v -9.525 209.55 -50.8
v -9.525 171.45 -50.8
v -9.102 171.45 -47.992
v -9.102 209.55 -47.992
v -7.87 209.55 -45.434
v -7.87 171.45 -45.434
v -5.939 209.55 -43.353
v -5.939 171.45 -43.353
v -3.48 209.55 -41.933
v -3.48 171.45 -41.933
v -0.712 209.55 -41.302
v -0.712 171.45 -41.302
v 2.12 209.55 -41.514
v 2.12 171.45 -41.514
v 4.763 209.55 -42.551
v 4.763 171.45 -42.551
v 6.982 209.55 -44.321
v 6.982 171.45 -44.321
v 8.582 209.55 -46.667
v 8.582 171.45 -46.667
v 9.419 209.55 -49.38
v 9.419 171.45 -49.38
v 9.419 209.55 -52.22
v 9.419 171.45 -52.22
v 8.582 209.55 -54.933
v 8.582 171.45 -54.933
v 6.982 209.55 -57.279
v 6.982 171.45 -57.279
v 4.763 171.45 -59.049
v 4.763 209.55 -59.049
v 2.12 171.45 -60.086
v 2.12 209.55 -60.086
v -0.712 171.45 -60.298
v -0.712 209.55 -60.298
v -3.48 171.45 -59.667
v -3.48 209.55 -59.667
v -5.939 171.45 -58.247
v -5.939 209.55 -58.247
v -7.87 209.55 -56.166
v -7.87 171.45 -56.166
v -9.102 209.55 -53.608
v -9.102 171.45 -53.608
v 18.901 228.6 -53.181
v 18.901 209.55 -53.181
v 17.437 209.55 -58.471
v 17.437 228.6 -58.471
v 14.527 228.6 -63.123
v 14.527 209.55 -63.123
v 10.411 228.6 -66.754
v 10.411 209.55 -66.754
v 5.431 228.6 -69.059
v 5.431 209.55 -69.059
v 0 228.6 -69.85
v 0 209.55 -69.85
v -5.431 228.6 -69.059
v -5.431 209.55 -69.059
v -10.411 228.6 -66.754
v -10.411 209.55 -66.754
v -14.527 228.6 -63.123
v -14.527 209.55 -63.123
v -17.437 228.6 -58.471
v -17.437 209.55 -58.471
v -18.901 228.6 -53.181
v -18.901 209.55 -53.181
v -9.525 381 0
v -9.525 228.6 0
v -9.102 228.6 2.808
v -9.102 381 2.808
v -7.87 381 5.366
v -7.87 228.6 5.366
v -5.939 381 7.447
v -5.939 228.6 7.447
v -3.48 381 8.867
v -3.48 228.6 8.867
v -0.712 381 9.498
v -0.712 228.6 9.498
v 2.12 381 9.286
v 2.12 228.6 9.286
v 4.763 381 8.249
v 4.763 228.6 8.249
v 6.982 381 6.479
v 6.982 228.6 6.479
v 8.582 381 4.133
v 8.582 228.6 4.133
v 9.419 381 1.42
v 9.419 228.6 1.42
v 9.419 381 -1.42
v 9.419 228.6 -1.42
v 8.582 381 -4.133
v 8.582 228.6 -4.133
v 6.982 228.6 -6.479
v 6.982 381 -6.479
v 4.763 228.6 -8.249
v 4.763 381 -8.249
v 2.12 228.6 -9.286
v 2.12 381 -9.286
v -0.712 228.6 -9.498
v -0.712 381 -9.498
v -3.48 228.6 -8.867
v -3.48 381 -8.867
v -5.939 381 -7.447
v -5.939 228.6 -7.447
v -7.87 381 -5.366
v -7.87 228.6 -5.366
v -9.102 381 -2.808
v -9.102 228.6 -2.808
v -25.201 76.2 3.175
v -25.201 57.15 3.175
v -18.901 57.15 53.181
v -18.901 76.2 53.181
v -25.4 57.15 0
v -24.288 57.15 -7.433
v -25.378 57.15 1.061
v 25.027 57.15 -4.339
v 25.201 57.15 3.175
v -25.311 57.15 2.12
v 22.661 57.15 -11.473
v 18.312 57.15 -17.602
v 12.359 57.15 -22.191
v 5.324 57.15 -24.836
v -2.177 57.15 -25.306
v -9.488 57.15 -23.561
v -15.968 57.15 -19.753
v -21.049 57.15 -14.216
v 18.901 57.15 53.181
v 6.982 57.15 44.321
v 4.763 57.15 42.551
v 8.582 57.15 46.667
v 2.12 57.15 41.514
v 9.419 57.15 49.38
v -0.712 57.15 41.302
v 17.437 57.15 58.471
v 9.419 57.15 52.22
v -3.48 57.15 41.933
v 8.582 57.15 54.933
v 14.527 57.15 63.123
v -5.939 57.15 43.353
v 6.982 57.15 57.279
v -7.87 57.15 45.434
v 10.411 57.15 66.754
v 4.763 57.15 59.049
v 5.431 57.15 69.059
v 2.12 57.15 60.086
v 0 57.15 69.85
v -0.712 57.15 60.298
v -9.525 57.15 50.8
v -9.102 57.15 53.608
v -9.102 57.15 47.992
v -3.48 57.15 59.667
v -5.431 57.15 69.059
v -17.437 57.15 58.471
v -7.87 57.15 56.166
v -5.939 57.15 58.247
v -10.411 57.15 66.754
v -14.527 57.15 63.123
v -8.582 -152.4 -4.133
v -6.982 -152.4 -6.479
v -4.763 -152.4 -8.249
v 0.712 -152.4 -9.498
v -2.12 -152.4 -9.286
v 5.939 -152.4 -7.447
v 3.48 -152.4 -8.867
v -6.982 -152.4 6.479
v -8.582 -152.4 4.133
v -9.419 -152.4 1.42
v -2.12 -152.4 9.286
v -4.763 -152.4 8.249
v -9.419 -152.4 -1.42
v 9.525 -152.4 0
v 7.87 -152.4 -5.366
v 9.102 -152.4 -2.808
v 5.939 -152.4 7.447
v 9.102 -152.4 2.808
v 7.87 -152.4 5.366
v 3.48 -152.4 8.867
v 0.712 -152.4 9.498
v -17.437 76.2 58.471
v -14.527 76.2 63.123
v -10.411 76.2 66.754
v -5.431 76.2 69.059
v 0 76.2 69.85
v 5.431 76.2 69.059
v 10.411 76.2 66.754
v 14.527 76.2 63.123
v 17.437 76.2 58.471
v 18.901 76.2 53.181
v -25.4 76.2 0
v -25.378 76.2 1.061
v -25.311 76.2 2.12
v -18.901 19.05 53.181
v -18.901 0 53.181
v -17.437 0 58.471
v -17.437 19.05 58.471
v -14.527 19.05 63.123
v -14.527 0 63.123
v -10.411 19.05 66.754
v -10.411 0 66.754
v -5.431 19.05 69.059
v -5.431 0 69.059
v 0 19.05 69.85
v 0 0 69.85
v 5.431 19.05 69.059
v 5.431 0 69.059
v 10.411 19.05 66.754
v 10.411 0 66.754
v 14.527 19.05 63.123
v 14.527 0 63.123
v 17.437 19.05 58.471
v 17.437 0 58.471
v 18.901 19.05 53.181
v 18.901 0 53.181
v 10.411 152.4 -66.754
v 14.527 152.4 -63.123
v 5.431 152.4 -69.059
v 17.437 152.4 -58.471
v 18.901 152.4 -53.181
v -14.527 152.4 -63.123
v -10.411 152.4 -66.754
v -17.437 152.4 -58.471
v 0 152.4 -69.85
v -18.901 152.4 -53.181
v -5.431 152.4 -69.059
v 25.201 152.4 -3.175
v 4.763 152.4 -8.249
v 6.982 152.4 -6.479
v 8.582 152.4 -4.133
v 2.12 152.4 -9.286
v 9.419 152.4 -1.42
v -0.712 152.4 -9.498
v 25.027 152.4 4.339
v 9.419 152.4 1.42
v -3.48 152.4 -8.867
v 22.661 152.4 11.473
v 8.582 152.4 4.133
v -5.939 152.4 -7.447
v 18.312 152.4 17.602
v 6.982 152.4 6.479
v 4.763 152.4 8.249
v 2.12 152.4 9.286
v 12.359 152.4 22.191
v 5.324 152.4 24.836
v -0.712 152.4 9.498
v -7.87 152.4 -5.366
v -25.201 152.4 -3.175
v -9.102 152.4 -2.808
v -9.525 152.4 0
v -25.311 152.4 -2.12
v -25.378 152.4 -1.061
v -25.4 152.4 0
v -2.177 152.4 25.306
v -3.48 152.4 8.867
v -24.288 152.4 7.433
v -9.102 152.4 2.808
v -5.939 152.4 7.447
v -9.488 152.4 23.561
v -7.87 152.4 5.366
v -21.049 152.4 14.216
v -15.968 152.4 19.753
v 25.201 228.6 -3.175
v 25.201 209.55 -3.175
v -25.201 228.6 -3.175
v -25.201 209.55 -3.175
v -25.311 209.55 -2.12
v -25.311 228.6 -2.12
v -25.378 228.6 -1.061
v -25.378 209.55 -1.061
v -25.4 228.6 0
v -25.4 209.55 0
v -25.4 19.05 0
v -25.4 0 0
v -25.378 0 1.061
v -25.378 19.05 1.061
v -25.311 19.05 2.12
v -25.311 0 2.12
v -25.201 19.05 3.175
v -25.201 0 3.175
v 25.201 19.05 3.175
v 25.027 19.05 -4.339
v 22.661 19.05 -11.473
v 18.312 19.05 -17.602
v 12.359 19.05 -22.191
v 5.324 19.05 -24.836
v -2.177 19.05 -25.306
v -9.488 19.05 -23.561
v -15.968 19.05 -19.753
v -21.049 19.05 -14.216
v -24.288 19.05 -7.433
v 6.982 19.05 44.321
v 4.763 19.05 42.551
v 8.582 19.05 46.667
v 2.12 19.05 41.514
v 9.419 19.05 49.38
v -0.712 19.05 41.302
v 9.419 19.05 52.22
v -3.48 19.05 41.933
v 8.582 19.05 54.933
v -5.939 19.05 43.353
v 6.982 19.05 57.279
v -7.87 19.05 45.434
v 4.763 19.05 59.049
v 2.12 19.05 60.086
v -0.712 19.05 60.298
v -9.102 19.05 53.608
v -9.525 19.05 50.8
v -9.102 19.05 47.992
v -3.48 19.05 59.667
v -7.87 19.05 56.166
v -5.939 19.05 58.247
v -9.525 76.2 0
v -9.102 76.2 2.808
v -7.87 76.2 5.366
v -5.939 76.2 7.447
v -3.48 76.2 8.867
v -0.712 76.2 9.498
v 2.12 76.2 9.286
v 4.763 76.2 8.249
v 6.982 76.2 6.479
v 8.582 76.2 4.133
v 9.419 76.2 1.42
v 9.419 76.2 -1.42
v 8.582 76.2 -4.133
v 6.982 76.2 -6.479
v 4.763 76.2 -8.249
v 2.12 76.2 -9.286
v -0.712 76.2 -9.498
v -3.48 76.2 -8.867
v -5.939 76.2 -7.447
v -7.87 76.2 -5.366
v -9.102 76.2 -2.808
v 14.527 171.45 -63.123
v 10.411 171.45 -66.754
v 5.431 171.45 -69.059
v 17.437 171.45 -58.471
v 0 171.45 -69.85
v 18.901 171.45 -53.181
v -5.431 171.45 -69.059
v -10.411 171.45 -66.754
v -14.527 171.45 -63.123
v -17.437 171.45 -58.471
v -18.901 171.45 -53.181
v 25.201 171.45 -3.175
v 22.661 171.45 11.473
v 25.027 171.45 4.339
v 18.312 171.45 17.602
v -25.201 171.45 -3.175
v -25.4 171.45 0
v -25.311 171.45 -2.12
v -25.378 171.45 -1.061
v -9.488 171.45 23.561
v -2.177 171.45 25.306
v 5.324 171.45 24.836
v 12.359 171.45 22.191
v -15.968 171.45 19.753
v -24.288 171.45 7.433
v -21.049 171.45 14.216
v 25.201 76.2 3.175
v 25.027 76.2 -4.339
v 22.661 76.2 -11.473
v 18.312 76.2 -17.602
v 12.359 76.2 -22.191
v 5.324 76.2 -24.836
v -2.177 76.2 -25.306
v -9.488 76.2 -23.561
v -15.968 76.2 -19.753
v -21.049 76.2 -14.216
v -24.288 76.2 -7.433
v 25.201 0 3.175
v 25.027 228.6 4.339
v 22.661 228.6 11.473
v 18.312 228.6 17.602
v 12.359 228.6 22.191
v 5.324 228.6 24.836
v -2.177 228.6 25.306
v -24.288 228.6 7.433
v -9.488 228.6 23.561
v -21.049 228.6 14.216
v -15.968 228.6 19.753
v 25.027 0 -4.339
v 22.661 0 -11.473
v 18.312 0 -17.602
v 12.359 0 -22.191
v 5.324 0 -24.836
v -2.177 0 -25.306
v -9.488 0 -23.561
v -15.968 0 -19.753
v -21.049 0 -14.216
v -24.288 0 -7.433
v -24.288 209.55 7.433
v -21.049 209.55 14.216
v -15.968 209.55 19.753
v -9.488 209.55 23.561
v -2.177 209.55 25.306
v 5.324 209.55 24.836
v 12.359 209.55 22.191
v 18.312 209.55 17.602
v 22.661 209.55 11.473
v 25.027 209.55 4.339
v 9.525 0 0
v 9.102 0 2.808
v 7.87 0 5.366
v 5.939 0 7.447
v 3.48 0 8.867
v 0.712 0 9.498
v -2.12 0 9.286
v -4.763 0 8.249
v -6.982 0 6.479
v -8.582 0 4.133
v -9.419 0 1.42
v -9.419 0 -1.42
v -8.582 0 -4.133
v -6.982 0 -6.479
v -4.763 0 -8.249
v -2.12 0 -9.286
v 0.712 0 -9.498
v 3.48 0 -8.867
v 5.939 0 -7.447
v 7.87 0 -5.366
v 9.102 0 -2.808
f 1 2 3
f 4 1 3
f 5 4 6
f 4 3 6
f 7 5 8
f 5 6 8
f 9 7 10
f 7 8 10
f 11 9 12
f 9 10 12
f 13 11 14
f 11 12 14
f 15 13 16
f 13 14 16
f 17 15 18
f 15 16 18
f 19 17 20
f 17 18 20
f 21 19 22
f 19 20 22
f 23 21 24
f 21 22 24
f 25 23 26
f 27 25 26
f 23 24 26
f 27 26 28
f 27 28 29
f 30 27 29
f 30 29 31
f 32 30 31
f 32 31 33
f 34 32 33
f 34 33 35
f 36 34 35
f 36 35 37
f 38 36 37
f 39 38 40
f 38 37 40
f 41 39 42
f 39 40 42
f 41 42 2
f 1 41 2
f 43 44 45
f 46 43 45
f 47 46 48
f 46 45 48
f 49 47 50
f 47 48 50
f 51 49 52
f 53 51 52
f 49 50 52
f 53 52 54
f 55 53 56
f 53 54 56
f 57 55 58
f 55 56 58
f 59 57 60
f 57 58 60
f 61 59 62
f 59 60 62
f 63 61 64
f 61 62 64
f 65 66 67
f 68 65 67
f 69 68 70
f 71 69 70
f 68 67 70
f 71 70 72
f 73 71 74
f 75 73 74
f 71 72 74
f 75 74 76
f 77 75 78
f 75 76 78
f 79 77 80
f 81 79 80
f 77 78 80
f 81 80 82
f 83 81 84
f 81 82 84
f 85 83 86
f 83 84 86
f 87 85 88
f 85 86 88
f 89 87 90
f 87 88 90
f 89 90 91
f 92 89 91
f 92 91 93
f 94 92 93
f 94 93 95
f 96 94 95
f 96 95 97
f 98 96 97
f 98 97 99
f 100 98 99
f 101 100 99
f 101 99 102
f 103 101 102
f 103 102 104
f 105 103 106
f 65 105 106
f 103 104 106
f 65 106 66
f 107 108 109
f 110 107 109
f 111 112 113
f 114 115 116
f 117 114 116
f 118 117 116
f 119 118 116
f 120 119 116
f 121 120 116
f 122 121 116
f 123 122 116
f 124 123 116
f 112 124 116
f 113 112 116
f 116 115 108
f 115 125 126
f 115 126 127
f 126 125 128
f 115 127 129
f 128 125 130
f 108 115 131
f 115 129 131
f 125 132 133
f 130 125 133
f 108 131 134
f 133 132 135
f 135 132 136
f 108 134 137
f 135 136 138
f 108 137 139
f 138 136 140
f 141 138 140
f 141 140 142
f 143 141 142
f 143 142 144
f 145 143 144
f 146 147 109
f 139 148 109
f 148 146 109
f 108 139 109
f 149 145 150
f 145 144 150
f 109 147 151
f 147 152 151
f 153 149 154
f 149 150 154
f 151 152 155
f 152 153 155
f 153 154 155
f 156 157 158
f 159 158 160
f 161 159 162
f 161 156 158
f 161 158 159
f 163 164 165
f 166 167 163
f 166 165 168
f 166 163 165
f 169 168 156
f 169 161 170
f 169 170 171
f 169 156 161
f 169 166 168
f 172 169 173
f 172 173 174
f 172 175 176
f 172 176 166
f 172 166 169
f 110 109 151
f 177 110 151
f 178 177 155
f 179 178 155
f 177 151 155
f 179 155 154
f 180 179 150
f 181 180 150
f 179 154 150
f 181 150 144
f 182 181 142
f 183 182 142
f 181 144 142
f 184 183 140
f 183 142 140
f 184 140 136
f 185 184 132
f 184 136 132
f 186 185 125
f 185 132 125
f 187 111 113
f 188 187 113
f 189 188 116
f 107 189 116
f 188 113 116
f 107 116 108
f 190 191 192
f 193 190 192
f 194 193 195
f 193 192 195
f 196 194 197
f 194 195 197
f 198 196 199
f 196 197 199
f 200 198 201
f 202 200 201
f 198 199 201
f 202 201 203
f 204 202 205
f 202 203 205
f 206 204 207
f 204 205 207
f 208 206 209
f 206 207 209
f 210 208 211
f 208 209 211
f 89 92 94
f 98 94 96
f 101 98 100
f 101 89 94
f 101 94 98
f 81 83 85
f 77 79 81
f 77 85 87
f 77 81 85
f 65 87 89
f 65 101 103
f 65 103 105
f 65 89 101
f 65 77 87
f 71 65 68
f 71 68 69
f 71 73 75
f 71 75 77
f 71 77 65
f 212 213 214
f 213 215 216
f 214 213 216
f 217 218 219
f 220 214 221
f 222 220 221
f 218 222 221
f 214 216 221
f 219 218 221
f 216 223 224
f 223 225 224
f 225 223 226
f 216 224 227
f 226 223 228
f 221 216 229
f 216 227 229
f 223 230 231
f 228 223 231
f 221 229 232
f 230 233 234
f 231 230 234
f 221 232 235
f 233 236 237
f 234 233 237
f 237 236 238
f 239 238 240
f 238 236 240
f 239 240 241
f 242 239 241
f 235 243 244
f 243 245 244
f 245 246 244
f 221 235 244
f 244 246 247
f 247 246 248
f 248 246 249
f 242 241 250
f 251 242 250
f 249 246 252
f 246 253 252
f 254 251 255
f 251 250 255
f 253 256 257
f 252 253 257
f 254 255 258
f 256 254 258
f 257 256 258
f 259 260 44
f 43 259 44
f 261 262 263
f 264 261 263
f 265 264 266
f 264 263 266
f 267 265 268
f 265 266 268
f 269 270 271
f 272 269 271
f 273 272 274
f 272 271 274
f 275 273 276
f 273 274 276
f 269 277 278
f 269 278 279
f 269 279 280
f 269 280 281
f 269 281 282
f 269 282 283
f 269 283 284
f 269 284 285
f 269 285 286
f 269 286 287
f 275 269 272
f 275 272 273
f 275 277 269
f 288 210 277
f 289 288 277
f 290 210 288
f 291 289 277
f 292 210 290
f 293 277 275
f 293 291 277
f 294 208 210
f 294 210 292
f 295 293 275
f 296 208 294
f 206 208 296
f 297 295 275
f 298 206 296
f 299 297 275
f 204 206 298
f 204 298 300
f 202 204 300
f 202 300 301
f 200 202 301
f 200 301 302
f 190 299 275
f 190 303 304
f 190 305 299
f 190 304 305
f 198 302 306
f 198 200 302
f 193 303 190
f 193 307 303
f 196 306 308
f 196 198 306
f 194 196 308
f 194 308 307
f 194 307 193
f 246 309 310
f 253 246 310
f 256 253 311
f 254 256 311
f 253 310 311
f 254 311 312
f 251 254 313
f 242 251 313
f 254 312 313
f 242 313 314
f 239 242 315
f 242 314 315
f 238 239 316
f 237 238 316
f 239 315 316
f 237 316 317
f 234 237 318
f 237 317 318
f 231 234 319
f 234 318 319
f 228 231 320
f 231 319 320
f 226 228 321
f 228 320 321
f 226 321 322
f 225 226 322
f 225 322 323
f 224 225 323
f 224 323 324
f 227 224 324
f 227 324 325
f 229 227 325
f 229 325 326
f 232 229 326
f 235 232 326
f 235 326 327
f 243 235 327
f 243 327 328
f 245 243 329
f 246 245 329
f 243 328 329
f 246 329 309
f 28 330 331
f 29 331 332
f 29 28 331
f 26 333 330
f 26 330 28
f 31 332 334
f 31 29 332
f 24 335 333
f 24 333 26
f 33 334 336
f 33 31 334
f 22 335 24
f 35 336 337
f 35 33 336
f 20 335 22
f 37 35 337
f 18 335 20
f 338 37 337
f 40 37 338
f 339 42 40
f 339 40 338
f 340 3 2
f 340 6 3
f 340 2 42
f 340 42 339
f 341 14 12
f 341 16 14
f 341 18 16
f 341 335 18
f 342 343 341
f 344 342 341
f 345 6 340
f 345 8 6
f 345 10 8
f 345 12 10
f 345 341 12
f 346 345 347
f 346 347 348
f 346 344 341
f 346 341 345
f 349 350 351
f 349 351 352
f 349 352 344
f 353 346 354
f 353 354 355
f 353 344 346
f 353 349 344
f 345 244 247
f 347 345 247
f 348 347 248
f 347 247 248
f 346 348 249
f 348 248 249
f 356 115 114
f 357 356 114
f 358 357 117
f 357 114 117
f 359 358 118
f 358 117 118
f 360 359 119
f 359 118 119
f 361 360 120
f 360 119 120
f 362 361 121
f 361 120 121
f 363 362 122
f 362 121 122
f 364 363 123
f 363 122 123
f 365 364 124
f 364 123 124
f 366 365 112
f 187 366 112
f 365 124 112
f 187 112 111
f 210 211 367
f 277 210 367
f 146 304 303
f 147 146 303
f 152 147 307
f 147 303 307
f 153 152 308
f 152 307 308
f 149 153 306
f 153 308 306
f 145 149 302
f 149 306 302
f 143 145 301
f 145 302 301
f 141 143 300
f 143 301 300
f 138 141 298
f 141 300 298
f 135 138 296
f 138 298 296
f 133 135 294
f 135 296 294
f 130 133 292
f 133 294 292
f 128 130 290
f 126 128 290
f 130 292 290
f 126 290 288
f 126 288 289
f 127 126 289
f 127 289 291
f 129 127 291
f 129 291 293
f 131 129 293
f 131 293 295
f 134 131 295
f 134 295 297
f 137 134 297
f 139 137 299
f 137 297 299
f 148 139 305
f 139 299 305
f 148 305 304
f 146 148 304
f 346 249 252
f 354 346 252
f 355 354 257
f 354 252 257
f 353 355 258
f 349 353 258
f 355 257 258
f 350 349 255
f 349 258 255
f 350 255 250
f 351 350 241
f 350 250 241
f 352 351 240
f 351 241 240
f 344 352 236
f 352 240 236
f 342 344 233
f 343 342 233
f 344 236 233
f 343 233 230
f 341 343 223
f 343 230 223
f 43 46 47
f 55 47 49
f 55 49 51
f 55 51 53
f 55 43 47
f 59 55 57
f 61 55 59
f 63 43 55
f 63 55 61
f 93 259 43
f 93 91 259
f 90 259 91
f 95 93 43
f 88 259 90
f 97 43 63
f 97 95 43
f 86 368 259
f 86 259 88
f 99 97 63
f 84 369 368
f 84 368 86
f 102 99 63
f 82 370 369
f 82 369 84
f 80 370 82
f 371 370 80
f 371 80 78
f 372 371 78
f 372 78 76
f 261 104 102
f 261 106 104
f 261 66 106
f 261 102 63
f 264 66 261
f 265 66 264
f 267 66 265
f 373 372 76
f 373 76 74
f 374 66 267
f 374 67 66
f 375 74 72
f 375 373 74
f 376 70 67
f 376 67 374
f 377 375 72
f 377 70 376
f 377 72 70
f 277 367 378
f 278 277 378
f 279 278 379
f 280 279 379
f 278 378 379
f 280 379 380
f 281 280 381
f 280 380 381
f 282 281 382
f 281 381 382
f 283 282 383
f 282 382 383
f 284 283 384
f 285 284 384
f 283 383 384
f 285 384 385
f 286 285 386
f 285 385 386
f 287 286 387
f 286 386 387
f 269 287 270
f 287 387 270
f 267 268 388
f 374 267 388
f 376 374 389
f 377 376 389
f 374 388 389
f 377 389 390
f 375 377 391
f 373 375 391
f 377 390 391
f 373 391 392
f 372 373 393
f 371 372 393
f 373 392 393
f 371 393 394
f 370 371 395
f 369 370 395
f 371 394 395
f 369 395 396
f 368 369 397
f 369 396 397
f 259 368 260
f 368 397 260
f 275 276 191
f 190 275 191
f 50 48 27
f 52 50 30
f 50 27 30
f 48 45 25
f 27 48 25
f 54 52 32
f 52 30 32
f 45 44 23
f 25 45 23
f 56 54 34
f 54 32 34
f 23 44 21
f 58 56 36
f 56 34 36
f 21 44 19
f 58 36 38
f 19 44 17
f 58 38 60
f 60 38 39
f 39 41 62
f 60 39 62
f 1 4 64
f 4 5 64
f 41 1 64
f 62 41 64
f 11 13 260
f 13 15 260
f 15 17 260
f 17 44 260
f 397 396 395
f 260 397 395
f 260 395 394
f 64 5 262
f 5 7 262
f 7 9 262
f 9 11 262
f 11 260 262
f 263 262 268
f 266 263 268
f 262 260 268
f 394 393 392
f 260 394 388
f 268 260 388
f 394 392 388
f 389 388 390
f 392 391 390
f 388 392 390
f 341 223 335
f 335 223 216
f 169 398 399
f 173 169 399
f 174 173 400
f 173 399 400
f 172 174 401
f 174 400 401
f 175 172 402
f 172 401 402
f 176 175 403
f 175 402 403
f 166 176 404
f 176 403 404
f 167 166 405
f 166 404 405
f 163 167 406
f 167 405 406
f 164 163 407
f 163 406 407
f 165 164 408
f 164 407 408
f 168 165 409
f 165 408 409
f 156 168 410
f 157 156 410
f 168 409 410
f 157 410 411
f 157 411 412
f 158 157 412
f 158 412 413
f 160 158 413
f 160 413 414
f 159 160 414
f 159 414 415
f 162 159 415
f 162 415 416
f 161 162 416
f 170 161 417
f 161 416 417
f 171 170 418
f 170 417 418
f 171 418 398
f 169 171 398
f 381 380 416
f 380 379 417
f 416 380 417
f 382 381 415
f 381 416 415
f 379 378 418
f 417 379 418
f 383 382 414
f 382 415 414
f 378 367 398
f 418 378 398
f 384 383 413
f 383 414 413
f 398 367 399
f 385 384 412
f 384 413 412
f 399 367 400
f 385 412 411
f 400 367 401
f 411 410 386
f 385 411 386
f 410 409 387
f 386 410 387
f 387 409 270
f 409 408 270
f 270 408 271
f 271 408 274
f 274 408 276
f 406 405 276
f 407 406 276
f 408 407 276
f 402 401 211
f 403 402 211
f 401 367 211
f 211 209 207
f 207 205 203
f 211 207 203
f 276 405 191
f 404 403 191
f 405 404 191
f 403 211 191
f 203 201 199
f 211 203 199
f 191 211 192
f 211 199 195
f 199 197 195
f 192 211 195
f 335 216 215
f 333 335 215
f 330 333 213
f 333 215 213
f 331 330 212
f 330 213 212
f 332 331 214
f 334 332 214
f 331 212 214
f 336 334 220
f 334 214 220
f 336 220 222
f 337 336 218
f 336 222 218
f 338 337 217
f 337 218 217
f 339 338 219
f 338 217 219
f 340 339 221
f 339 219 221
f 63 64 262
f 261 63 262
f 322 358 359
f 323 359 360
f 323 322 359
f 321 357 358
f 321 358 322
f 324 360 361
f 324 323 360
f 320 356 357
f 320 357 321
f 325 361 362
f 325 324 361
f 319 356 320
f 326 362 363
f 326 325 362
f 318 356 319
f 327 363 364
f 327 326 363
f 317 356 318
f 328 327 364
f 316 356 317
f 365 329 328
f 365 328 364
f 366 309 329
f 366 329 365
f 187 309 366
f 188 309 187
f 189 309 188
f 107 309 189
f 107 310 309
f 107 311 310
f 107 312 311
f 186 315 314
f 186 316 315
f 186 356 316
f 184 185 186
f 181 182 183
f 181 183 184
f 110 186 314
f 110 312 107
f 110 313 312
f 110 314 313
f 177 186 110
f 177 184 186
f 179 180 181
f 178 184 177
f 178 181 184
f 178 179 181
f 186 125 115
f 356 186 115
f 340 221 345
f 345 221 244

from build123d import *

# Parameters (mm, degrees)
F0_R      = 9.525
F1_DEPTH  = 152.4
F2_R      = 9.525
F3_DEPTH  = 19.05
F4_R      = 9.525
F5_DEPTH  = 38.1
F7_DEPTH  = 19.05
F8_R      = 9.525
F9_DEPTH  = 76.2
F11_DEPTH = 19.05
F12_R     = 9.525
F13_DEPTH = 38.1
F15_DEPTH = 19.05
F16_R     = 9.525
F17_DEPTH = 152.4


with BuildPart() as f1:
    # F0 (on Front) → F1 (new body)
    with BuildSketch(Plane.XZ):
        Circle(F0_R)
    extrude(amount=F1_DEPTH)

    # F2 (on face) → F3 (join)
    with BuildSketch(Plane(origin=(0, 0, 0), x_dir=(-1, 0, 0), z_dir=(0, 1, 0))):
        with BuildLine():
            ThreePointArc((-18.9005859708, 53.1812496635), (-1.1929663147, 31.7873902009), (19.05, 50.8))
            ThreePointArc((19.05, 50.8), (19.012609793, 51.992966411), (18.9005859467, 53.1812498549))
            ThreePointArc((18.9005859467, 53.1812498549), (-9.64e-08, 69.85), (-18.9005859708, 53.1812496635))
        make_face()
        with Locations((0, 50.8)):
            Circle(F2_R, mode=Mode.SUBTRACT)
        with BuildLine():
            ThreePointArc((18.9005859467, 53.1812498549), (19.012609793, 51.992966411), (19.05, 50.8))
            ThreePointArc((19.05, 50.8), (-1.1929663147, 31.7873902009), (-18.9005859708, 53.1812496635))
            Line((-18.9005859708, 53.1812496635), (-25.2007812071, 3.1750002442))
            ThreePointArc((-25.2007812071, 3.1750002442), (2.614e-07, 25.4), (25.2007812725, 3.1749997256))
            Line((25.2007812725, 3.1749997256), (18.9005859467, 53.1812498549))
        make_face()
        with BuildLine():
            ThreePointArc((25.4, 0), (25.3501463933, 1.5906218406), (25.2007812725, 3.1749997256))
            ThreePointArc((25.2007812725, 3.1749997256), (2.614e-07, 25.4), (-25.2007812071, 3.1750002442))
            ThreePointArc((-25.2007812071, 3.1750002442), (-1.5906221014, -25.3501463769), (25.4, 0))
        make_face()
        with Locations((0, 50.8)):
            Circle(F2_R)
    extrude(amount=F3_DEPTH)

    # F4 (on face) → F5 (join)
    with BuildSketch(Plane(origin=(0, 19.05, 0), x_dir=(-1, 0, 0), z_dir=(0, 1, 0))):
        with Locations((0, 50.8)):
            Circle(F4_R)
    extrude(amount=F5_DEPTH)

    # F6 (on face) → F7 (join)
    with BuildSketch(Plane(origin=(0, 57.15, 0), x_dir=(-1, 0, 0), z_dir=(0, 1, 0))):
        with BuildLine():
            ThreePointArc((-18.9005859708, 53.1812496635), (-1.1929663147, 31.7873902009), (19.05, 50.8))
            ThreePointArc((19.05, 50.8), (19.0126097893, 51.9929664704), (18.9005859318, 53.1812499732))
            ThreePointArc((18.9005859318, 53.1812499732), (-1.561e-07, 69.85), (-18.9005859708, 53.1812496635))
        make_face()
        with BuildLine():
            ThreePointArc((18.9005859318, 53.1812499732), (19.0126097893, 51.9929664704), (19.05, 50.8))
            ThreePointArc((19.05, 50.8), (-1.1929663147, 31.7873902009), (-18.9005859708, 53.1812496635))
            Line((-18.9005859708, 53.1812496635), (-25.200781271, 3.1749997374))
            ThreePointArc((-25.200781271, 3.1749997374), (-1.19e-07, 25.4), (25.2007812412, 3.1749999736))
            Line((25.2007812412, 3.1749999736), (18.9005859318, 53.1812499732))
        make_face()
        with BuildLine():
            ThreePointArc((25.4, 0), (25.3501463854, 1.5906219653), (25.2007812412, 3.1749999736))
            ThreePointArc((25.2007812412, 3.1749999736), (-1.19e-07, 25.4), (-25.200781271, 3.1749997374))
            ThreePointArc((-25.200781271, 3.1749997374), (-1.5906218465, -25.3501463929), (25.4, 0))
        make_face()
    extrude(amount=F7_DEPTH)

    # F8 (on face) → F9 (join)
    with BuildSketch(Plane(origin=(0, 76.2, 0), x_dir=(-1, 0, 0), z_dir=(0, 1, 0))):
        Circle(F8_R)
    extrude(amount=F9_DEPTH)

    # F10 (on face) → F11 (join)
    with BuildSketch(Plane(origin=(0, 152.4, 0), x_dir=(-1, 0, 0), z_dir=(0, 1, 0))):
        with BuildLine():
            ThreePointArc((25.2007812725, -3.1749997255), (25.3501463933, -1.5906218405), (25.4, 0))
            ThreePointArc((25.4, 0), (-1.5906219941, 25.3501463836), (-25.200781234, -3.1750000308))
            ThreePointArc((-25.200781234, -3.1750000308), (1.539e-07, -25.4), (25.2007812725, -3.1749997255))
        make_face()
        with BuildLine():
            ThreePointArc((25.2007812725, -3.1749997255), (1.539e-07, -25.4), (-25.200781234, -3.1750000308))
            Line((-25.200781234, -3.1750000308), (-18.9005859708, -53.1812496635))
            ThreePointArc((-18.9005859708, -53.1812496635), (-1.1929663147, -31.7873902009), (19.05, -50.8))
            ThreePointArc((19.05, -50.8), (19.012609782, -51.9929665866), (18.9005859027, -53.1812502041))
            Line((18.9005859027, -53.1812502041), (25.2007812725, -3.1749997255))
        make_face()
        with BuildLine():
            ThreePointArc((19.05, -50.8), (-1.1929663147, -31.7873902009), (-18.9005859708, -53.1812496635))
            ThreePointArc((-18.9005859708, -53.1812496635), (-2.724e-07, -69.85), (18.9005859027, -53.1812502041))
            ThreePointArc((18.9005859027, -53.1812502041), (19.012609782, -51.9929665866), (19.05, -50.8))
        make_face()
    extrude(amount=F11_DEPTH)

    # F12 (on face) → F13 (join)
    with BuildSketch(Plane(origin=(0, 171.45, 0), x_dir=(-1, 0, 0), z_dir=(0, 1, 0))):
        with Locations((0, -50.8)):
            Circle(F12_R)
    extrude(amount=F13_DEPTH)

    # F14 (on face) → F15 (join)
    with BuildSketch(Plane(origin=(0, 209.55, 0), x_dir=(-1, 0, 0), z_dir=(0, 1, 0))):
        with BuildLine():
            ThreePointArc((18.900585933, -53.1812499633), (19.0126097896, -51.9929664655), (19.05, -50.8))
            ThreePointArc((19.05, -50.8), (-1.1929664809, -31.7873902114), (-18.9005859292, -53.1812499939))
            ThreePointArc((-18.9005859292, -53.1812499939), (1.54e-08, -69.85), (18.900585933, -53.1812499633))
        make_face()
        with BuildLine():
            ThreePointArc((-18.9005859292, -53.1812499939), (-1.1929664809, -31.7873902114), (19.05, -50.8))
            ThreePointArc((19.05, -50.8), (19.0126097896, -51.9929664655), (18.900585933, -53.1812499633))
            Line((18.900585933, -53.1812499633), (25.2007812062, -3.1750002518))
            ThreePointArc((25.2007812062, -3.1750002518), (2.227e-07, -25.4), (-25.2007811505, -3.1750006937))
            Line((-25.2007811505, -3.1750006937), (-18.9005859292, -53.1812499939))
        make_face()
        with BuildLine():
            ThreePointArc((25.4, 0), (-1.5906223275, 25.3501463627), (-25.2007811505, -3.1750006937))
            ThreePointArc((-25.2007811505, -3.1750006937), (2.227e-07, -25.4), (25.2007812062, -3.1750002518))
            ThreePointArc((25.2007812062, -3.1750002518), (25.3501463767, -1.5906221053), (25.4, 0))
        make_face()
    extrude(amount=F15_DEPTH)

    # F16 (on face) → F17 (join)
    with BuildSketch(Plane(origin=(0, 228.6, 0), x_dir=(-1, 0, 0), z_dir=(0, 1, 0))):
        Circle(F16_R)
    extrude(amount=F17_DEPTH)


solid = f1.part
